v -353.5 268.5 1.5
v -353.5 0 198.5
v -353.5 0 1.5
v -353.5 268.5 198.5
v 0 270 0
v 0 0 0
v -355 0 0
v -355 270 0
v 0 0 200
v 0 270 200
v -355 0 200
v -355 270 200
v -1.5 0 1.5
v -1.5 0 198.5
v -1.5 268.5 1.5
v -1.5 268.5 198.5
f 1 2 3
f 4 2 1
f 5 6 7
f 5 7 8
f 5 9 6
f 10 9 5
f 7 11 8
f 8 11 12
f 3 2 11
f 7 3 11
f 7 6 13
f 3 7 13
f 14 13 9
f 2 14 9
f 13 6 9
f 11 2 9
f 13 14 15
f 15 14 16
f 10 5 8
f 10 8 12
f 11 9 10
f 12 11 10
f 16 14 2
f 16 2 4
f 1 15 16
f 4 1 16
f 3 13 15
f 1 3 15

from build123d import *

# Parameters (mm, degrees)
F0_W     = 270
F0_H     = 200
F1_DEPTH = 355
F2_T     = -1.5


with BuildPart() as f1:
    # F0 (on Right) → F1 (new body)
    with BuildSketch(Plane.YZ):
        with Locations((135, 100)):
            Rectangle(F0_W, F0_H)
    extrude(amount=-F1_DEPTH)

    # F2
    f2_openings = [f1.faces().sort_by_distance(p)[0] for p in [
        (-177.5, 0, 100),
    ]]
    offset(amount=F2_T, openings=f2_openings)


solid = f1.part
